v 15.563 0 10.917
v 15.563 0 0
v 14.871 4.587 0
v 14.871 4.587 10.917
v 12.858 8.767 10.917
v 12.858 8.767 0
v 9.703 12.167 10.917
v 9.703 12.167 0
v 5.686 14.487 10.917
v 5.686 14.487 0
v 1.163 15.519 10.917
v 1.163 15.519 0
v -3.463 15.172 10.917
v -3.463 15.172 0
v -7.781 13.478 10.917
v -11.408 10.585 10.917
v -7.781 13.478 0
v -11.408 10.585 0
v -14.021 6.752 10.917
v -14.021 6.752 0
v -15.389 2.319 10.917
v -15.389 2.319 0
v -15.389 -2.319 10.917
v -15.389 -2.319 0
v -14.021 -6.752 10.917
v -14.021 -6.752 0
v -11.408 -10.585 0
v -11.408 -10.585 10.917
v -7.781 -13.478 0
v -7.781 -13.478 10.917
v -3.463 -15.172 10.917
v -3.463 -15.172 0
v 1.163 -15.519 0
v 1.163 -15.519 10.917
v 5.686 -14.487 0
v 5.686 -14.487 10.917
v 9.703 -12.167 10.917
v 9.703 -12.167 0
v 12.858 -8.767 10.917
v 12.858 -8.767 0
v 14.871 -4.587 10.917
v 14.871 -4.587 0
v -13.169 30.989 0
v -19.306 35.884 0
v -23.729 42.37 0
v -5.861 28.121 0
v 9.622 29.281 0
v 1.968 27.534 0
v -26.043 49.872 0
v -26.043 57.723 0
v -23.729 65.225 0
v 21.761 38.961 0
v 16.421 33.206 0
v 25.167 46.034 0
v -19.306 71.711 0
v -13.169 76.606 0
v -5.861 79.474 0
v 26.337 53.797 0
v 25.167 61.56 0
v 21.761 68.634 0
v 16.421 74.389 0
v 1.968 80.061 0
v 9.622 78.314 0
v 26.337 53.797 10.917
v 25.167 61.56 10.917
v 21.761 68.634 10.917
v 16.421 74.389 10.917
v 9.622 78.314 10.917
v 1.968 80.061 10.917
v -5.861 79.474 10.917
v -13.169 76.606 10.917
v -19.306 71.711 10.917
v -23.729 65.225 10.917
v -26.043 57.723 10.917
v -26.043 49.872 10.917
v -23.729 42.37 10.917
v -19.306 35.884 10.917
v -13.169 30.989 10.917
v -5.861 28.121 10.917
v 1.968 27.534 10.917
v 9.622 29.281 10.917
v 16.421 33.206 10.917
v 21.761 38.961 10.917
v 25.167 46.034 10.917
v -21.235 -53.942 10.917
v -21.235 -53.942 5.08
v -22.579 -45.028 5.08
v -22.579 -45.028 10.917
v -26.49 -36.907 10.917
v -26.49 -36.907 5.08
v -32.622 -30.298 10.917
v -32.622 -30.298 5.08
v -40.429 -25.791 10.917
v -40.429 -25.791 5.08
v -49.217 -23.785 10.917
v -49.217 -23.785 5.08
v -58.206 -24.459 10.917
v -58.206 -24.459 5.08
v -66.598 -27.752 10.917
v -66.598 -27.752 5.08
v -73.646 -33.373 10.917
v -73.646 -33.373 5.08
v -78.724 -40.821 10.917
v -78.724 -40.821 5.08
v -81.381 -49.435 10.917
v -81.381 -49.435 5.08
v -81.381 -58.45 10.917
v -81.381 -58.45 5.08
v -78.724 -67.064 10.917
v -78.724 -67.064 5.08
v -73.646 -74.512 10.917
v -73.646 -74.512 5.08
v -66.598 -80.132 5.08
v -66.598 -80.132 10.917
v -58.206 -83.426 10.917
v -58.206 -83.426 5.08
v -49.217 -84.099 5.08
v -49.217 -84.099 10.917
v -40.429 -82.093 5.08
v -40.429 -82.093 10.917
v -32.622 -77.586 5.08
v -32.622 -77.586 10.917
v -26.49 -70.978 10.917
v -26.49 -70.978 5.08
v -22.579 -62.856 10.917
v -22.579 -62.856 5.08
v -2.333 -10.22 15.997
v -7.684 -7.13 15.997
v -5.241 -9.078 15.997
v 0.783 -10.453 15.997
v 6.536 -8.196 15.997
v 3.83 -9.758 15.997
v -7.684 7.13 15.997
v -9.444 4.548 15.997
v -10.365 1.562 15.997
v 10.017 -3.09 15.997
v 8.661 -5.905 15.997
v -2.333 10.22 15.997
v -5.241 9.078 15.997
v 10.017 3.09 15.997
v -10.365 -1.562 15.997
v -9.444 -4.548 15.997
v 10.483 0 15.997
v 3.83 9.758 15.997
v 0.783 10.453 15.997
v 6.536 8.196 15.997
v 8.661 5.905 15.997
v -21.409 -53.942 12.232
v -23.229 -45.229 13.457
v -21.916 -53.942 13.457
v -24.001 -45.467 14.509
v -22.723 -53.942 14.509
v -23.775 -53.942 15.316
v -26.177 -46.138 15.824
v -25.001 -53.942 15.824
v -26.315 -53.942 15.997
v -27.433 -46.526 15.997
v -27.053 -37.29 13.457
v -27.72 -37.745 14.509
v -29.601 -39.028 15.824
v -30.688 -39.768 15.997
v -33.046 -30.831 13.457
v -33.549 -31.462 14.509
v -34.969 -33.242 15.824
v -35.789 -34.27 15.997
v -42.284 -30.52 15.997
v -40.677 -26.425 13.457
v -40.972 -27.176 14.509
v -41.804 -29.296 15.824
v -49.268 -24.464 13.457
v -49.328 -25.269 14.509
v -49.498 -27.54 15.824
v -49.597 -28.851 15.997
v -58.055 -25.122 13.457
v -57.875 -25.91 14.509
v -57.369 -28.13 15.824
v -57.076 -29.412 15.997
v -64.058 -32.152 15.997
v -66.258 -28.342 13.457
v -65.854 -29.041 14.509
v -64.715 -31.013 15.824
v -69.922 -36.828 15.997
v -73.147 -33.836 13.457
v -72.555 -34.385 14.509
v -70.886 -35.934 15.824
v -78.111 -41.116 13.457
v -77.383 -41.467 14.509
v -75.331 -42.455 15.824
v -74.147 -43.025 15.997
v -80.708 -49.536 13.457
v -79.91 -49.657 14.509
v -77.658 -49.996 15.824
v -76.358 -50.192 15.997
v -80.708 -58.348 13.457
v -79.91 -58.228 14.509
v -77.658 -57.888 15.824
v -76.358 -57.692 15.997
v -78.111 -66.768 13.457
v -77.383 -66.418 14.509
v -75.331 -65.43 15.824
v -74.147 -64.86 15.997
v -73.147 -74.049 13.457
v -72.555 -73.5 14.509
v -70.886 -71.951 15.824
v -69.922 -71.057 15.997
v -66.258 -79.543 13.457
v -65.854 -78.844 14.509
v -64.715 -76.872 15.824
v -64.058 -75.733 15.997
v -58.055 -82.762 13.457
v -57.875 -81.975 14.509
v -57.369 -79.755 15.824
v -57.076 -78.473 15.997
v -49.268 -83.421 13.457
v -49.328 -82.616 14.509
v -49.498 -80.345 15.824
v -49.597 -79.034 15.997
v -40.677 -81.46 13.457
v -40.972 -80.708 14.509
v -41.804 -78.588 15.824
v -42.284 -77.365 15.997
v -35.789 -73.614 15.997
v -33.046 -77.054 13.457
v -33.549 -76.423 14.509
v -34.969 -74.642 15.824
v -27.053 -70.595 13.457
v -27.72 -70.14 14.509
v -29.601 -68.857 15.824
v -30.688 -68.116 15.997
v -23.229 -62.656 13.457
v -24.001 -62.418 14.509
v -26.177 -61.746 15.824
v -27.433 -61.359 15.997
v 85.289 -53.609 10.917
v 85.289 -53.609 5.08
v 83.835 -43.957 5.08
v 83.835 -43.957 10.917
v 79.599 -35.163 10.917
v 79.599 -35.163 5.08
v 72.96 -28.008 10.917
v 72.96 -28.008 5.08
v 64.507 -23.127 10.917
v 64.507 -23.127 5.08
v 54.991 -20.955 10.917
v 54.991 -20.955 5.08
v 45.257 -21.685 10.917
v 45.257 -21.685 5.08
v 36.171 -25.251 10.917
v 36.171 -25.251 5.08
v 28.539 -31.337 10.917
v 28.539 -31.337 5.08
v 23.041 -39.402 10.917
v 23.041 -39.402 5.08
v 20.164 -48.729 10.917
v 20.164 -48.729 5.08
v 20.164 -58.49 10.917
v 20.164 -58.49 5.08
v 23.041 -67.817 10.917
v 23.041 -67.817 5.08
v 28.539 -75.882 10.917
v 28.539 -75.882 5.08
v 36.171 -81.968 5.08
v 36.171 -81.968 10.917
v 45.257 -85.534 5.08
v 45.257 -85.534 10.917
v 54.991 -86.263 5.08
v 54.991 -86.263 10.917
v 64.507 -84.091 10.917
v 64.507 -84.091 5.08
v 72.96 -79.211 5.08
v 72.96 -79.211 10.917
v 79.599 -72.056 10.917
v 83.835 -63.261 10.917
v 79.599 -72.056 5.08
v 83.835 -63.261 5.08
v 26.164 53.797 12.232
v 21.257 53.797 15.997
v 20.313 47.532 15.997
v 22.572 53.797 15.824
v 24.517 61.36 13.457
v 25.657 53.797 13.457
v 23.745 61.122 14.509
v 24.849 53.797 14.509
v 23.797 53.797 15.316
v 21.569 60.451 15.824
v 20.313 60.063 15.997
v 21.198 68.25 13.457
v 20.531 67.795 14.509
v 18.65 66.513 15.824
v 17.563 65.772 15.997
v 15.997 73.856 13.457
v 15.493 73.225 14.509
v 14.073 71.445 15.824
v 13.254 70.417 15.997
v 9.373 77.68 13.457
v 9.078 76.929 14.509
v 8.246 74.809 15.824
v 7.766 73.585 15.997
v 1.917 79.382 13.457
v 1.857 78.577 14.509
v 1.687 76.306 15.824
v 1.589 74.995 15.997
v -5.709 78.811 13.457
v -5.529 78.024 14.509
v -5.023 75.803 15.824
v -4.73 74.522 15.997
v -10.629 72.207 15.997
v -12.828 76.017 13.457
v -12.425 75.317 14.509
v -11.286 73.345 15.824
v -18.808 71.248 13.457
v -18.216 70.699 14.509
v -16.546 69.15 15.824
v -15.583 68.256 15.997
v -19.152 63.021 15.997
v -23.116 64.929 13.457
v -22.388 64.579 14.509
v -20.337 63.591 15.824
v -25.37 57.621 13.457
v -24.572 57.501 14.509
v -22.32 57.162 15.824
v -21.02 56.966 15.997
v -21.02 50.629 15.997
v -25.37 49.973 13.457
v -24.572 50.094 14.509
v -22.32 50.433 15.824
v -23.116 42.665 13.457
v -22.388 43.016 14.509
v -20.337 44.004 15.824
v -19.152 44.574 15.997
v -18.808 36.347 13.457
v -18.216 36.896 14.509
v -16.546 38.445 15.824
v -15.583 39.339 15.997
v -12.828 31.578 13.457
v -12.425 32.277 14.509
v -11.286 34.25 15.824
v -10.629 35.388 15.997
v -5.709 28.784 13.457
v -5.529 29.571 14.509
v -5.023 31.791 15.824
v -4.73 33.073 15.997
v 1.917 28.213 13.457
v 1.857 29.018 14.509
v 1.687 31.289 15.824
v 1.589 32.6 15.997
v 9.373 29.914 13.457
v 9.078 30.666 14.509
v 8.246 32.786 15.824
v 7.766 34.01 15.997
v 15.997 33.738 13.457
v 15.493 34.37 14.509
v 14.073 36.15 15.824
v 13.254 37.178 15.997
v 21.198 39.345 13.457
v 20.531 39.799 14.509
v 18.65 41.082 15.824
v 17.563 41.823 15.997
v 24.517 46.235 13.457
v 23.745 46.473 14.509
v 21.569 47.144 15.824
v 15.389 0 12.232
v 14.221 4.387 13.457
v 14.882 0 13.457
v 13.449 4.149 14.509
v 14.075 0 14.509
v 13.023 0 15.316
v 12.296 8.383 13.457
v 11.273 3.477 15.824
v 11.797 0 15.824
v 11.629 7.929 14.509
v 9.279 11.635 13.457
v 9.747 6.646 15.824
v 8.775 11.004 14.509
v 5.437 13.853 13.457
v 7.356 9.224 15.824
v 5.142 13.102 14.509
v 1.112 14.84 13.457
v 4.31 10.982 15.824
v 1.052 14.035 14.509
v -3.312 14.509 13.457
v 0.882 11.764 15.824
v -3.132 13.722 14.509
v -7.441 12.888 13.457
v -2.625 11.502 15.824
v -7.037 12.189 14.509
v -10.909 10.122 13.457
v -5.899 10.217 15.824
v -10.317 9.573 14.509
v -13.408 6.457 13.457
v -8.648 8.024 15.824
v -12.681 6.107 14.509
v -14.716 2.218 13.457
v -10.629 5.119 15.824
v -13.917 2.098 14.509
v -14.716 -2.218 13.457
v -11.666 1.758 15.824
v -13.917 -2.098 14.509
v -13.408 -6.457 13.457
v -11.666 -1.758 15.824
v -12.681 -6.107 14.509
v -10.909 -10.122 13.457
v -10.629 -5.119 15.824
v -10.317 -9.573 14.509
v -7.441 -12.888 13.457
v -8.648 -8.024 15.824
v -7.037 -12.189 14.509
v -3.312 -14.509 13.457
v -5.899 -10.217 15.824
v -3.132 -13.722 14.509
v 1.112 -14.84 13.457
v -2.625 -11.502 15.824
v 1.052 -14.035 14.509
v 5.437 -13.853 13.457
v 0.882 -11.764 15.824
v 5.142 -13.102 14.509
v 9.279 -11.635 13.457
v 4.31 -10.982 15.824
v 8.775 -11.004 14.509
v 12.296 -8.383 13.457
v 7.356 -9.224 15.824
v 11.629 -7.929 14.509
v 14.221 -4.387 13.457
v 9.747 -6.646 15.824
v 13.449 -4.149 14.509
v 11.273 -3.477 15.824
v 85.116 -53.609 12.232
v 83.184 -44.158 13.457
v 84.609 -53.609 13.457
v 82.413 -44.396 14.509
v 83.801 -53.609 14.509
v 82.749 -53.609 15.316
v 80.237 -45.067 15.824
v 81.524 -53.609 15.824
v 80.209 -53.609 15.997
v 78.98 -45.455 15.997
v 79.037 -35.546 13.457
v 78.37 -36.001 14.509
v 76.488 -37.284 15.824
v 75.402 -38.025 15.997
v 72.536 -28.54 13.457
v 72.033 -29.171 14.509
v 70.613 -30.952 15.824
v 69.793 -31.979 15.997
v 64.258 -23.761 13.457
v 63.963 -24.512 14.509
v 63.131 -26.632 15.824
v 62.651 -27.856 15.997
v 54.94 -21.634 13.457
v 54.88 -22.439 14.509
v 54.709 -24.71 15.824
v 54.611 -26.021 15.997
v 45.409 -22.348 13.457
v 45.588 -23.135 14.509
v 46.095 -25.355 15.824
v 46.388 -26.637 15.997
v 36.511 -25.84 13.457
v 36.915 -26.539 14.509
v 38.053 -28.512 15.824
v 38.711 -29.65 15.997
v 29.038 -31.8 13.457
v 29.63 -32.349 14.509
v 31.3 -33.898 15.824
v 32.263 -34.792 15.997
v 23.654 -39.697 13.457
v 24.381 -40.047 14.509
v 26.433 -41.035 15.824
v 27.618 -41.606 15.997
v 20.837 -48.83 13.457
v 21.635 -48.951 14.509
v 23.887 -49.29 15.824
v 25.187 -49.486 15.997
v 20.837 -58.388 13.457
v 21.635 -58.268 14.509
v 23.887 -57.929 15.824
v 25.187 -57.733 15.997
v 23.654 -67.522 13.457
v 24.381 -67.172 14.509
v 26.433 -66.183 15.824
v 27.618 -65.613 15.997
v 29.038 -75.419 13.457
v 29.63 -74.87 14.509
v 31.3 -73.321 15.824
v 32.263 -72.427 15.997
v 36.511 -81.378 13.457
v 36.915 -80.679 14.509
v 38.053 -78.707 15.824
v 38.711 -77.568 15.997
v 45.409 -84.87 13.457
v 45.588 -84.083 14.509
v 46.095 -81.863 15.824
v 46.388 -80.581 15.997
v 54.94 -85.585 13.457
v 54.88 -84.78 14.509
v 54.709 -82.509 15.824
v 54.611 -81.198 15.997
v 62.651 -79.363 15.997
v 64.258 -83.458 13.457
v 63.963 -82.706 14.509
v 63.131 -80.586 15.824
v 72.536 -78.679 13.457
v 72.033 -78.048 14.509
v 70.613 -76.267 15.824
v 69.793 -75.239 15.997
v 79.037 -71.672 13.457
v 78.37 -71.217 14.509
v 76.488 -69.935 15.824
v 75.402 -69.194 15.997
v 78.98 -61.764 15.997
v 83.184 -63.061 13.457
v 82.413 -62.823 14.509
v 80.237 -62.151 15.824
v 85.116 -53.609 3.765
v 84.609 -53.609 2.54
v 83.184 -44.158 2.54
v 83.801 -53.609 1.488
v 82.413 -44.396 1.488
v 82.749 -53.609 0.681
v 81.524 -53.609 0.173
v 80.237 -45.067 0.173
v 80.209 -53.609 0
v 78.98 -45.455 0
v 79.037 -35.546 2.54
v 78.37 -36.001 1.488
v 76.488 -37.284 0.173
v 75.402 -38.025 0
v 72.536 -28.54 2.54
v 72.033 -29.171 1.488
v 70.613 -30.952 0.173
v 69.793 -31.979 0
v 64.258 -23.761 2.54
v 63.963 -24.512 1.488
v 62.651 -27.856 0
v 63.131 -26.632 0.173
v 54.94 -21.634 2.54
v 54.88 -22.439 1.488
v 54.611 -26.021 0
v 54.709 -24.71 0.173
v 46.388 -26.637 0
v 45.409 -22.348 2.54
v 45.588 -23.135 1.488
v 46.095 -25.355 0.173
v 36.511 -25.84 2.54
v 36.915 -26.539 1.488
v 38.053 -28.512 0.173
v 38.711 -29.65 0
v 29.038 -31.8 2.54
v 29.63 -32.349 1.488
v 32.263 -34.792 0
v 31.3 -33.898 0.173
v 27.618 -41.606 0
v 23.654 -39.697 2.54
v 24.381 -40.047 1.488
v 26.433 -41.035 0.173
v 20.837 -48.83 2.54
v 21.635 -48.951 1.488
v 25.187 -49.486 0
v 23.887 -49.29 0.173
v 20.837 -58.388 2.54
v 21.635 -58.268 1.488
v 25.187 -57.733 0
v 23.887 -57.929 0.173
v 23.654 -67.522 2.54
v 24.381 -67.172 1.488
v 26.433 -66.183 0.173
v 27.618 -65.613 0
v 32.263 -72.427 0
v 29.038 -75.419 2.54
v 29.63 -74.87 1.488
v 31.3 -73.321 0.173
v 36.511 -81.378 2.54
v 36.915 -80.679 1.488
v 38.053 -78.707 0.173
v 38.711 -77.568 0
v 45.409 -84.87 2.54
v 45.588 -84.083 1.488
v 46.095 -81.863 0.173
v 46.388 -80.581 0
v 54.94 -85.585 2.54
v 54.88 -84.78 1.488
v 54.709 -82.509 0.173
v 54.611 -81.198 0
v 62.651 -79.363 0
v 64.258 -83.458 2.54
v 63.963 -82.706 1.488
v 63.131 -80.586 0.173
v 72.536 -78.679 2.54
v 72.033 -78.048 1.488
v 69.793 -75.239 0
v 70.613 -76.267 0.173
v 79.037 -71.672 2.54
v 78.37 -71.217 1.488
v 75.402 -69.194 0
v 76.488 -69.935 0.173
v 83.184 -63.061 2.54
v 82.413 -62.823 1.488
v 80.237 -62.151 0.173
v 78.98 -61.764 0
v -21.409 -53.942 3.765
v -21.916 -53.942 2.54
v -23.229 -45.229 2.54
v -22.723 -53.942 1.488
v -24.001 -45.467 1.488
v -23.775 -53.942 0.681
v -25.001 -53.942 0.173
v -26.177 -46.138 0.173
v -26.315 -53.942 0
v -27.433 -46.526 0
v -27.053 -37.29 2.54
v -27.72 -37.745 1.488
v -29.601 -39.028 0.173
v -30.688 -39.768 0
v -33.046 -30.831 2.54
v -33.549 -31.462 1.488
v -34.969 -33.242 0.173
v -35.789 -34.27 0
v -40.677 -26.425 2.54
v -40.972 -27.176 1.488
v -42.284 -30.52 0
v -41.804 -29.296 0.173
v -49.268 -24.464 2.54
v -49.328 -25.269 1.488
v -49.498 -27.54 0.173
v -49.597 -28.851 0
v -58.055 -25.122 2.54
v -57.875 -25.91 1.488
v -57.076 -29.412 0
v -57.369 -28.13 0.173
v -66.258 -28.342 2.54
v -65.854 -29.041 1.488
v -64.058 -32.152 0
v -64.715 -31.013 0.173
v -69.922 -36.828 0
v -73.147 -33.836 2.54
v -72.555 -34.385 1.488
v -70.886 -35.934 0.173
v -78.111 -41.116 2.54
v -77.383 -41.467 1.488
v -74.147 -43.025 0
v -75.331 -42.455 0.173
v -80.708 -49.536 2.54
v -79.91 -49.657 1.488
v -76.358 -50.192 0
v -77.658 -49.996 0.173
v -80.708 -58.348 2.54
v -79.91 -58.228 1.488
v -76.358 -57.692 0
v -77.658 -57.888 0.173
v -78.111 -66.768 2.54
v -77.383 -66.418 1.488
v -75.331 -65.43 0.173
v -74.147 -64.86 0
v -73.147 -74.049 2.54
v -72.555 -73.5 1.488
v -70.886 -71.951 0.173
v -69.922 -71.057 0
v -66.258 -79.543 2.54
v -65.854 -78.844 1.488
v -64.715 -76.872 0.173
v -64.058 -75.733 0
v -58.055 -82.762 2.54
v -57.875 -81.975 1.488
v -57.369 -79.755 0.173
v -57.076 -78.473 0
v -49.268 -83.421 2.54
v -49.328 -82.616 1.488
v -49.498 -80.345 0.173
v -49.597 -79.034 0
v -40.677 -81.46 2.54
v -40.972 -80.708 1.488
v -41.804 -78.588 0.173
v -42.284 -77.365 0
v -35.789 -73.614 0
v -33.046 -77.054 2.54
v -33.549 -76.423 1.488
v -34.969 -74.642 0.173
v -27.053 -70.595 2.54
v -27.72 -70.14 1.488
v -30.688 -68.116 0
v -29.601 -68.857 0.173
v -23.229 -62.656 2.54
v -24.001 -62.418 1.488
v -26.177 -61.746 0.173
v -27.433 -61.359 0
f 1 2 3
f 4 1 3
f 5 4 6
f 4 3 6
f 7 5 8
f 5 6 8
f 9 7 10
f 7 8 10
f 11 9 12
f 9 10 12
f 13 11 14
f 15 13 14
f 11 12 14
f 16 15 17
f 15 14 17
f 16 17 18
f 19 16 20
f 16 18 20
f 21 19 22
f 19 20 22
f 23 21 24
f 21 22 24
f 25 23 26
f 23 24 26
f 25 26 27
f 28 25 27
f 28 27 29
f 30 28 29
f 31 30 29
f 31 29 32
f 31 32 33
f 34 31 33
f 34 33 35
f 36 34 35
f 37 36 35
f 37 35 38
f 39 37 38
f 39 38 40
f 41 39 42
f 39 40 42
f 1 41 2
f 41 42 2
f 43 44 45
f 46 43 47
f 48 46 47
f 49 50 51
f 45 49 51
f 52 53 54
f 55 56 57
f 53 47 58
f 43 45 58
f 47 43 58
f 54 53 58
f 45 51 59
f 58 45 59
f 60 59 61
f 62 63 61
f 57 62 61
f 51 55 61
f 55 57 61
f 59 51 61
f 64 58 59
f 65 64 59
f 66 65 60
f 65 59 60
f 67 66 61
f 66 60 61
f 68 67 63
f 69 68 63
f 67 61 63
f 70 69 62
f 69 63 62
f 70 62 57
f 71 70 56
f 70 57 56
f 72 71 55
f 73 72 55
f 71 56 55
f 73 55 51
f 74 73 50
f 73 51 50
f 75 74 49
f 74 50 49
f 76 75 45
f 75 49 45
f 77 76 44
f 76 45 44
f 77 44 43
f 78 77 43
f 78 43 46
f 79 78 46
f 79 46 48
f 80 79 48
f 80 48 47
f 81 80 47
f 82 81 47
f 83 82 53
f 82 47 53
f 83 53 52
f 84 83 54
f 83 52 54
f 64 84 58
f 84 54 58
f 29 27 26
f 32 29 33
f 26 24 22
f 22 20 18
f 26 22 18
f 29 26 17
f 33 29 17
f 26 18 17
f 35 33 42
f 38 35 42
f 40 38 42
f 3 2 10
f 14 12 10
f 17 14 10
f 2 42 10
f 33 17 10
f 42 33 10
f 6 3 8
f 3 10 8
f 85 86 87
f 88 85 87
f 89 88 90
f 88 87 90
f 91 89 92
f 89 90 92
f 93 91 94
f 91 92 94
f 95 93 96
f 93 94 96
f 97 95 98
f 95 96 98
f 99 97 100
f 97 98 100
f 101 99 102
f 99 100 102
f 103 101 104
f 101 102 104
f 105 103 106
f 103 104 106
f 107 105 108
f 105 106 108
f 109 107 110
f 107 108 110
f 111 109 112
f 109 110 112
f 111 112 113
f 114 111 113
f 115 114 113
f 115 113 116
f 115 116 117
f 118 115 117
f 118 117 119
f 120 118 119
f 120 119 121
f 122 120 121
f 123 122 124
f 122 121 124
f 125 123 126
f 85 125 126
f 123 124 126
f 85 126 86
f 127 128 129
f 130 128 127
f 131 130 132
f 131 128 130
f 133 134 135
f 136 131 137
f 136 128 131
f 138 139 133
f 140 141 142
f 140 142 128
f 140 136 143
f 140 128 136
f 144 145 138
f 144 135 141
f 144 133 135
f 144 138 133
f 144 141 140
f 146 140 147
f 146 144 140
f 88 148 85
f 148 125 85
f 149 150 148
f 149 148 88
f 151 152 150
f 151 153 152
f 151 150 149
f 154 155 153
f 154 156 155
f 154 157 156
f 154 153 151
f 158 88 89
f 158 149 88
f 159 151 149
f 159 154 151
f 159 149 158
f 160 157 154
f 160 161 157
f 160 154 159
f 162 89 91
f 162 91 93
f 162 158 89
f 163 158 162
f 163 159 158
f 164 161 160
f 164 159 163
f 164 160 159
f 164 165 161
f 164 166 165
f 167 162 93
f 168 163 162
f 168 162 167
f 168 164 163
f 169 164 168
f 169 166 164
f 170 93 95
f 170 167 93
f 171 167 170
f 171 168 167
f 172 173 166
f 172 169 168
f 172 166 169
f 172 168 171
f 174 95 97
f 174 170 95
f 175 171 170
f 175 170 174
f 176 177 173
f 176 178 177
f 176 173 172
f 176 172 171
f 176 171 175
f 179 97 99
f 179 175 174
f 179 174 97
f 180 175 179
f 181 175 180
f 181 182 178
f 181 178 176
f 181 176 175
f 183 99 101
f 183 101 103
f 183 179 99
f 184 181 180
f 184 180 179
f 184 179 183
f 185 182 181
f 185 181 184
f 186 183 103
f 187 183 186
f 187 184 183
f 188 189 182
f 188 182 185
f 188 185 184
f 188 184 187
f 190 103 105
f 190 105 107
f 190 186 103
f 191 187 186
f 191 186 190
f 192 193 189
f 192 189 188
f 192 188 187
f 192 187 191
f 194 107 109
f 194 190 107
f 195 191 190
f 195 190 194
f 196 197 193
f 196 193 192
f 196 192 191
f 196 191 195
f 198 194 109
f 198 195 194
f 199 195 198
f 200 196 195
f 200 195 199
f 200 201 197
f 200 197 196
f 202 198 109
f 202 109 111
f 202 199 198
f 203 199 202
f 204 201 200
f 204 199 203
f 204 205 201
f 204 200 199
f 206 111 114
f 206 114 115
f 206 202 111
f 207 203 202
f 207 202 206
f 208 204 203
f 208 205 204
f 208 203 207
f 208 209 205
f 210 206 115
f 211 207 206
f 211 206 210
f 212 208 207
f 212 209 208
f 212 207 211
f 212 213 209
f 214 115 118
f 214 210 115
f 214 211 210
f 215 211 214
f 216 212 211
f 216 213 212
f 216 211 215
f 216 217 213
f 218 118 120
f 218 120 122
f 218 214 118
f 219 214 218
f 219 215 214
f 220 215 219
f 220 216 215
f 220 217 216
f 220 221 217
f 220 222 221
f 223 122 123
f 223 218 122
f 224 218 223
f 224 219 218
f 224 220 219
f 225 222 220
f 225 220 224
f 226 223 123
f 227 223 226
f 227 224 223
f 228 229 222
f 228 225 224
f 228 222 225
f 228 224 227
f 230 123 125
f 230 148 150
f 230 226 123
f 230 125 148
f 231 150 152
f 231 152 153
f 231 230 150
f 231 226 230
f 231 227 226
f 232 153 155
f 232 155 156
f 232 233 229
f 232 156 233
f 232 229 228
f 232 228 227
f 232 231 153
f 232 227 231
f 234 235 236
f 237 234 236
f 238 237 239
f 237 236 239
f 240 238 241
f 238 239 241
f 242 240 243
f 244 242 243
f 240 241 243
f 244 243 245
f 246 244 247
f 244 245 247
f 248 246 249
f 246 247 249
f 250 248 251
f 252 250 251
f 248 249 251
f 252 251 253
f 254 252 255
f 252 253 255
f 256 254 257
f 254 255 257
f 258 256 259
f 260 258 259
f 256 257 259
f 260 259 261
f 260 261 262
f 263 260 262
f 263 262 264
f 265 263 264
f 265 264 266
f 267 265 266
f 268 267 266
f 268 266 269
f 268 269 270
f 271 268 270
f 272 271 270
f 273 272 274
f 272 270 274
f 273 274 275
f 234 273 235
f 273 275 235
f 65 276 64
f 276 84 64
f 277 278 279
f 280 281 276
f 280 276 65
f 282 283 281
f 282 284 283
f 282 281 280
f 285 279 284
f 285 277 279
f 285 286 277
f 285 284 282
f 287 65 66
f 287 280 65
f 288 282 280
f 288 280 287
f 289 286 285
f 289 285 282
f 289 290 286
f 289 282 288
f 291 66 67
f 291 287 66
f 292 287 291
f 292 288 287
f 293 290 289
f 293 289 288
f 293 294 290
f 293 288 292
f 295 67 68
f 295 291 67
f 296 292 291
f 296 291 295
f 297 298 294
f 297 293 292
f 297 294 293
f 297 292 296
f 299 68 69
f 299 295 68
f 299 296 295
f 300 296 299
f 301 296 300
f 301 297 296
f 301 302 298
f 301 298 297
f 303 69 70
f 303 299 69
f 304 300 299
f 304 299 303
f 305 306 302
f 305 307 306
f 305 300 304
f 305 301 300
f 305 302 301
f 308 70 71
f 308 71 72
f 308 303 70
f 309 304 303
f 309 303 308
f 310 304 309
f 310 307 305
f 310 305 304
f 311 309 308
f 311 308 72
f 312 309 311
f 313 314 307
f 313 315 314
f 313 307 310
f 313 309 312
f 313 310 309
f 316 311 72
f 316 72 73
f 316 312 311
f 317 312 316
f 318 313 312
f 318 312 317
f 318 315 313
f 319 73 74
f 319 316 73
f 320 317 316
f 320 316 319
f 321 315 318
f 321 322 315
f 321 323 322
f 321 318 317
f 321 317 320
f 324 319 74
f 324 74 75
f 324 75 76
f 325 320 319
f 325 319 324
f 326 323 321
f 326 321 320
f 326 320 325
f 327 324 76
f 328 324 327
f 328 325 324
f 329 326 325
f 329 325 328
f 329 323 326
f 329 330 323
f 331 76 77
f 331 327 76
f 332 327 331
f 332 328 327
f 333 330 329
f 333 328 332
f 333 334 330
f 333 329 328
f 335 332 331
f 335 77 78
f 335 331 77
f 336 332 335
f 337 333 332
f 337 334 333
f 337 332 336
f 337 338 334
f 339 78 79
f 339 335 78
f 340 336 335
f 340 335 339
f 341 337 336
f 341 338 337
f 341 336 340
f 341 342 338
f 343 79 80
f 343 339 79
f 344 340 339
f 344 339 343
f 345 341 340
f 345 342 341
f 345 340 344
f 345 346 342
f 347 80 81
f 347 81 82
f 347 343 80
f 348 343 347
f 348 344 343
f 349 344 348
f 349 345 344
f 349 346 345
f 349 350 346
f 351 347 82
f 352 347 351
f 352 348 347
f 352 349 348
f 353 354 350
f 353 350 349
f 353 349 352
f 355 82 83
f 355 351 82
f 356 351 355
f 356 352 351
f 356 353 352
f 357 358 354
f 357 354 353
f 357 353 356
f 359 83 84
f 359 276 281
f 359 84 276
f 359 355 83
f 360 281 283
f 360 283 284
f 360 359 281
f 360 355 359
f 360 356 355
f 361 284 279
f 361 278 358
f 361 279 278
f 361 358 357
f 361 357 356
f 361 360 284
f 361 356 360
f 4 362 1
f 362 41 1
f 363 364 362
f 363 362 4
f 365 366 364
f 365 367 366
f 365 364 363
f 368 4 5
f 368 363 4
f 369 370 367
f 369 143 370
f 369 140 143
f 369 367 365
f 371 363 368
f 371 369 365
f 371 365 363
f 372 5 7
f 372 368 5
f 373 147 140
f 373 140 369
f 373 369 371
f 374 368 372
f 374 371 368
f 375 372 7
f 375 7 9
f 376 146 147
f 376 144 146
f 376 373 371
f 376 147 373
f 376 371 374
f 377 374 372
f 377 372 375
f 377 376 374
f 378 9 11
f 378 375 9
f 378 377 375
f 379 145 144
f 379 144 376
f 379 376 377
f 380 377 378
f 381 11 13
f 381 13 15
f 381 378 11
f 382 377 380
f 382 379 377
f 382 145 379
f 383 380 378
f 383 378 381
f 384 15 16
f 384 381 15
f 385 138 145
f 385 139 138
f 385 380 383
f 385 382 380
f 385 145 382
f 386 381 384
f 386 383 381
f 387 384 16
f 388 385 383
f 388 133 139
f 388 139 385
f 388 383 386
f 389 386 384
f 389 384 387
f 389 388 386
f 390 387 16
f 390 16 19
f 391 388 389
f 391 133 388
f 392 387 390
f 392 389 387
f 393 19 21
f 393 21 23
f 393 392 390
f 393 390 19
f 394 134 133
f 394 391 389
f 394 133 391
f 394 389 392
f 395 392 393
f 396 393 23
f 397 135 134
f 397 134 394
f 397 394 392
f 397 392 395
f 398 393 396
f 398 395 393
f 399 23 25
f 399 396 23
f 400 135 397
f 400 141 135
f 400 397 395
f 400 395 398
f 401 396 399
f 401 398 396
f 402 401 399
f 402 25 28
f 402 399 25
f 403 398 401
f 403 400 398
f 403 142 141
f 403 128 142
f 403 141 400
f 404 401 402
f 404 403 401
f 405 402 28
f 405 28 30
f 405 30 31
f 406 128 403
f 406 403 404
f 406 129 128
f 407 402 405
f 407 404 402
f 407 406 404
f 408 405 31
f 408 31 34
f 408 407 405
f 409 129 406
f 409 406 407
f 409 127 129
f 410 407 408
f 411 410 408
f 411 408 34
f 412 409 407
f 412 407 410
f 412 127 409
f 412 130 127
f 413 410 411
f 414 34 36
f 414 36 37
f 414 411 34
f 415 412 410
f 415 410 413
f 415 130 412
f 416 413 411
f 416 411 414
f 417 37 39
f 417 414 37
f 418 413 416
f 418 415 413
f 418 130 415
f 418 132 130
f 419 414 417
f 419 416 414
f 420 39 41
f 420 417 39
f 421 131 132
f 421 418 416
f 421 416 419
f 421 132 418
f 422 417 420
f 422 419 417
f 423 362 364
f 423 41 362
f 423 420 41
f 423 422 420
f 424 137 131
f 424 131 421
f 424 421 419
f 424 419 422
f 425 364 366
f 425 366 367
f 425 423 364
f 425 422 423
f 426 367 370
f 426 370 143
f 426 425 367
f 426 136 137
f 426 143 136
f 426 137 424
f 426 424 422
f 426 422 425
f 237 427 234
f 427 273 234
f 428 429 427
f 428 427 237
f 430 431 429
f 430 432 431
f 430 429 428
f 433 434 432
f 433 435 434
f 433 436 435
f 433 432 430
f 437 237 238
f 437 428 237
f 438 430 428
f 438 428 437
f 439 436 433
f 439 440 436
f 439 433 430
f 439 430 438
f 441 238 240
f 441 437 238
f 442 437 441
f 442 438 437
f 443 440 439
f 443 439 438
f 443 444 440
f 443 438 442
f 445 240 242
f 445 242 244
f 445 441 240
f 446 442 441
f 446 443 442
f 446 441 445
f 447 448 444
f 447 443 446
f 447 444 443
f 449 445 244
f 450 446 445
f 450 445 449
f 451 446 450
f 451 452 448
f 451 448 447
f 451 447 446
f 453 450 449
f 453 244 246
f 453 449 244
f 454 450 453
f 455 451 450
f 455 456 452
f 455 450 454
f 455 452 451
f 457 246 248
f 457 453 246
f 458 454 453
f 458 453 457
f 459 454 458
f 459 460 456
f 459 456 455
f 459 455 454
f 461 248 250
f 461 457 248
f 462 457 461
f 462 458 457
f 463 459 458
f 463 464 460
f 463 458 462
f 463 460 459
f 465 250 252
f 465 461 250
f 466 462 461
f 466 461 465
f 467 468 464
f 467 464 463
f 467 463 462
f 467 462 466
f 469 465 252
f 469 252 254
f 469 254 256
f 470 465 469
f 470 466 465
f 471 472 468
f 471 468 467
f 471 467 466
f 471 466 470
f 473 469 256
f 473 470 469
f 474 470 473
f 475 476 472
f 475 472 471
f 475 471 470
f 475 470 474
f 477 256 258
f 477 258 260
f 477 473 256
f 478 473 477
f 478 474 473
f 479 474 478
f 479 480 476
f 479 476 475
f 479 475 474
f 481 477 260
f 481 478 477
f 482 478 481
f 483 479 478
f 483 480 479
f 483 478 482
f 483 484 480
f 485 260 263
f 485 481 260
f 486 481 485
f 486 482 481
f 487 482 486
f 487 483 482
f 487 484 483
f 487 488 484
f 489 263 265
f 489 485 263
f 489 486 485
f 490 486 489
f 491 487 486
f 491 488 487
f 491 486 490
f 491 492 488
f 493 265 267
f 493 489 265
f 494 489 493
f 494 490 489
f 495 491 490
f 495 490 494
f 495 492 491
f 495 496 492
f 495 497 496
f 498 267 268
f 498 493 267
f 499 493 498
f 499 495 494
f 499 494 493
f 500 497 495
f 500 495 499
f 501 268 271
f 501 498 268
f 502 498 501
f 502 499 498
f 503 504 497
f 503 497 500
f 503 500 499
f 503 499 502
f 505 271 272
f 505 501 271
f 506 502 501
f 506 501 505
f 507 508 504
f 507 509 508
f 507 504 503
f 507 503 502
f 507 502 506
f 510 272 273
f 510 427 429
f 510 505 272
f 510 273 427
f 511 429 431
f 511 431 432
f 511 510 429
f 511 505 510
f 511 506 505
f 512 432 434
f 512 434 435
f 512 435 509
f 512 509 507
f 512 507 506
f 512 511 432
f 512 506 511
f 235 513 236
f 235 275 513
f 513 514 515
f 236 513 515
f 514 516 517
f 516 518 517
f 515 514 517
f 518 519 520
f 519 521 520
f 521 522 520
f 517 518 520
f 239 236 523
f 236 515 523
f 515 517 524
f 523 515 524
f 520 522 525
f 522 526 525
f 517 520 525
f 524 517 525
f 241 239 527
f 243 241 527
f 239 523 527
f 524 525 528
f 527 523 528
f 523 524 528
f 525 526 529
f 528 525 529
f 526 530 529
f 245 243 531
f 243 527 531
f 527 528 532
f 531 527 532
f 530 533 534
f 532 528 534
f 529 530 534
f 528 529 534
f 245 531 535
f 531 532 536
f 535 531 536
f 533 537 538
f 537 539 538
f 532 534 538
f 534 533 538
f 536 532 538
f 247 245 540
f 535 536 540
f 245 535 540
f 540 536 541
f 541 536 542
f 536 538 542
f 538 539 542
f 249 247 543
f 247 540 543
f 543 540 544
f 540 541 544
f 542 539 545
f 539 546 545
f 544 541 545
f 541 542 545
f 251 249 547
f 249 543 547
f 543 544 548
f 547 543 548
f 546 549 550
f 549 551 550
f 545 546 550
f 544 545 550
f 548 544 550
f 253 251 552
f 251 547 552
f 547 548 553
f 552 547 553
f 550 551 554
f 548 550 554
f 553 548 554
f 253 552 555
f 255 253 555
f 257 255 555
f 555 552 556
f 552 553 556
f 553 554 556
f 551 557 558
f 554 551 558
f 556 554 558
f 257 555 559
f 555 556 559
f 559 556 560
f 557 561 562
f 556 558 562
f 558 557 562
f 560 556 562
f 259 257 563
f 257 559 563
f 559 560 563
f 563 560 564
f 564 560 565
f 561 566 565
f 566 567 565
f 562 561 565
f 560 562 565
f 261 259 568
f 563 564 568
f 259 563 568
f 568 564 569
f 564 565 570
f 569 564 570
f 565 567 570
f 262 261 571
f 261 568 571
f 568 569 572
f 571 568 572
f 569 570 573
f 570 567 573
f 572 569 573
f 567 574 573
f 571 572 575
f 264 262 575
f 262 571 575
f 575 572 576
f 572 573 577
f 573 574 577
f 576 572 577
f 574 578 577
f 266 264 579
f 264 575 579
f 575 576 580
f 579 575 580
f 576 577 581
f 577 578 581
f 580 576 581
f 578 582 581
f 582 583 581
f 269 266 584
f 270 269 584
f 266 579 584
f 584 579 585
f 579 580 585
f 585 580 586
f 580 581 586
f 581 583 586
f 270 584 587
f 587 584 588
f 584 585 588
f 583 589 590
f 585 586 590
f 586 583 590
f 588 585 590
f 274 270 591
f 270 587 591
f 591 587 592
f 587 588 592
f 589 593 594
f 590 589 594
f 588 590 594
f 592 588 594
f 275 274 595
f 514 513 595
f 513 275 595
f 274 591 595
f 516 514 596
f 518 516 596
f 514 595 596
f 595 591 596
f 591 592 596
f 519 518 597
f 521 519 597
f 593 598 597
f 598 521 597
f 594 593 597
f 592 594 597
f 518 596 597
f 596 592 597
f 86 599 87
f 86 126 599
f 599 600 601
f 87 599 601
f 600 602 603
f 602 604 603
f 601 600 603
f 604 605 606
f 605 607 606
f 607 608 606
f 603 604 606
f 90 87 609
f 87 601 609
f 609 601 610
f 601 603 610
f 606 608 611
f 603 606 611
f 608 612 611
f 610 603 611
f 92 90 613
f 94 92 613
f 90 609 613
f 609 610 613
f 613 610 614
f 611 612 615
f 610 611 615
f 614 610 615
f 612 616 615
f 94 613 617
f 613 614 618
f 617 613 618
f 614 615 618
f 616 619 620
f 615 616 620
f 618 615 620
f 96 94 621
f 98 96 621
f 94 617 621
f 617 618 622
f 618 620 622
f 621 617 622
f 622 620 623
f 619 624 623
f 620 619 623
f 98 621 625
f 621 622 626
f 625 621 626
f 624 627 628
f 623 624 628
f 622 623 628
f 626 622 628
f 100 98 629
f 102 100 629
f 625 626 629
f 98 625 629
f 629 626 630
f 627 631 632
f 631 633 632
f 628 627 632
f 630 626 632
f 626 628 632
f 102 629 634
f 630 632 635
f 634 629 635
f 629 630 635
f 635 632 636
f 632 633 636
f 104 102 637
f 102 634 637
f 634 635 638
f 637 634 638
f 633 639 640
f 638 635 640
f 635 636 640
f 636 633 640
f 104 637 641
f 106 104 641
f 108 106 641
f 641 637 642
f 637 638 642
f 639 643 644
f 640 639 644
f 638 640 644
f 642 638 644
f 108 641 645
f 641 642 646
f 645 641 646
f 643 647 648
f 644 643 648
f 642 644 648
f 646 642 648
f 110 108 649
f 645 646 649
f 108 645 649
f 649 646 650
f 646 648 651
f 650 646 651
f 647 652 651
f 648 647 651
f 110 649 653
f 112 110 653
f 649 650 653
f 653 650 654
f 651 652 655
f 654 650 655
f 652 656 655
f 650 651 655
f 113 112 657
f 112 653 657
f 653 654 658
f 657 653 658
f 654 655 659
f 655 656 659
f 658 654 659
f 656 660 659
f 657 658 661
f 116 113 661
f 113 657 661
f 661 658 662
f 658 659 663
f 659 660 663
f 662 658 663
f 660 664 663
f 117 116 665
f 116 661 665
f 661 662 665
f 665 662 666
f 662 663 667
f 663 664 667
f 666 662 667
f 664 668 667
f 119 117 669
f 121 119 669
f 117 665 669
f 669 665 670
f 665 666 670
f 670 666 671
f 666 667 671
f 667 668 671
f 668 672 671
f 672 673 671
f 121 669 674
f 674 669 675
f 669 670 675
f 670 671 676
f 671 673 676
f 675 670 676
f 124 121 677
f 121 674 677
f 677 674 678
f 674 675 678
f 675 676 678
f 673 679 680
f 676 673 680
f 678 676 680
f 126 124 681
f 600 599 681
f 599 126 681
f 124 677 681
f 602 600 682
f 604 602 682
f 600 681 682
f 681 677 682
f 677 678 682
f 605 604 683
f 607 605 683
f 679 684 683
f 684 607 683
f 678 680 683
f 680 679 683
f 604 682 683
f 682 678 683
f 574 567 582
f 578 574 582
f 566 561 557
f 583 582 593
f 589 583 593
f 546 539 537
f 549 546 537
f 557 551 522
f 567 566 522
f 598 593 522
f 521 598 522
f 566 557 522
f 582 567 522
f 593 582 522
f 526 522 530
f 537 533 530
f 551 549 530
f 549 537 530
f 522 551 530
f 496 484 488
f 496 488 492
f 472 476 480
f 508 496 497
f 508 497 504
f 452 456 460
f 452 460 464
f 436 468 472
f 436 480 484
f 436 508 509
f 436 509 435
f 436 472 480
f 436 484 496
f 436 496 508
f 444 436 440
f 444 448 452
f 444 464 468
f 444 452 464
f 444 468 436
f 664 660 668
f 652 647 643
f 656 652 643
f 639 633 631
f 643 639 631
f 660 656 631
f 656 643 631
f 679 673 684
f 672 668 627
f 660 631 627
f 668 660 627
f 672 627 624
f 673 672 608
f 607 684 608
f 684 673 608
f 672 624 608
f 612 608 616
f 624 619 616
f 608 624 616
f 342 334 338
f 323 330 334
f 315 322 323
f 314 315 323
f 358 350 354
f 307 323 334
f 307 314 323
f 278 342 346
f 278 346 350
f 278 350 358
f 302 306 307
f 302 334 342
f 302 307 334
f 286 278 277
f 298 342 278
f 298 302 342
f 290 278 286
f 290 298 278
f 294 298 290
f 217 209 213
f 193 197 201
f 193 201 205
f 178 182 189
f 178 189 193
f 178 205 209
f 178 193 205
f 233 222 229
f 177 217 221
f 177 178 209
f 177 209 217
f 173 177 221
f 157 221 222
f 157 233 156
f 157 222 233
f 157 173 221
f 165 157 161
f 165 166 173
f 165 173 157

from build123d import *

# Parameters (mm, degrees)
F1_R     = 32.7456463168
F2_DEPTH = 15.9970168024
F1_R_2   = 30.2415831597
F1_R_3   = 26.3371113364
F0_R     = 15.5625582152
F3_R     = 5.08
F3_2_R   = 5.08
F3_3_R   = 5.08
F3_4_R   = 5.08


# Not quite as in the source:
# - a feature of the source that left no trace in its solid (it failed there, or was rolled back) is left out


with BuildPart() as f2:
    # F1 (on Top) → F2 (new body)
    with BuildSketch(Plane.XY):
        with Locations((52.5437146425, -53.609341383)):
            Circle(F1_R)
    extrude(amount=F2_DEPTH)

    # F3
    f3_edges = [f2.edges().sort_by_distance(p)[0] for p in [
        (19.798068, -53.609341, 15.997017),
        (19.798068, -53.609341, 0),
    ]]
    fillet(f3_edges, radius=F3_R)


with BuildPart() as f2b:
    # F1 (on Top) → F2, piece 2 (new body)
    with BuildSketch(Plane.XY):
        with Locations((-51.4770336449, -53.9423078299)):
            Circle(F1_R_2)
    extrude(amount=F2_DEPTH)

    # F3#2
    f3_2_edges = [f2b.edges().sort_by_distance(p)[0] for p in [
        (-81.718617, -53.942308, 15.997017),
        (-81.718617, -53.942308, 0),
    ]]
    fillet(f3_2_edges, radius=F3_2_R)


with BuildPart() as f2c:
    # F1 (on Top) → F2, piece 3 (new body)
    with BuildSketch(Plane.XY):
        with Locations((0, 53.7974014878)):
            Circle(F1_R_3)
    extrude(amount=F2_DEPTH)

    # F3#3
    f3_3_edges = [f2c.edges().sort_by_distance(p)[0] for p in [
        (-26.337111, 53.797401, 15.997017),
    ]]
    fillet(f3_3_edges, radius=F3_3_R)


with BuildPart() as f2d:
    # F0 (on Top) → F2, piece 4 (new body)
    with BuildSketch(Plane.XY):
        Circle(F0_R)
    extrude(amount=F2_DEPTH)

    # F3#4
    f3_4_edges = [f2d.edges().sort_by_distance(p)[0] for p in [
        (-15.562558, 0, 15.997017),
    ]]
    fillet(f3_4_edges, radius=F3_4_R)


solid = Compound([f2.part, f2b.part, f2c.part, f2d.part])
